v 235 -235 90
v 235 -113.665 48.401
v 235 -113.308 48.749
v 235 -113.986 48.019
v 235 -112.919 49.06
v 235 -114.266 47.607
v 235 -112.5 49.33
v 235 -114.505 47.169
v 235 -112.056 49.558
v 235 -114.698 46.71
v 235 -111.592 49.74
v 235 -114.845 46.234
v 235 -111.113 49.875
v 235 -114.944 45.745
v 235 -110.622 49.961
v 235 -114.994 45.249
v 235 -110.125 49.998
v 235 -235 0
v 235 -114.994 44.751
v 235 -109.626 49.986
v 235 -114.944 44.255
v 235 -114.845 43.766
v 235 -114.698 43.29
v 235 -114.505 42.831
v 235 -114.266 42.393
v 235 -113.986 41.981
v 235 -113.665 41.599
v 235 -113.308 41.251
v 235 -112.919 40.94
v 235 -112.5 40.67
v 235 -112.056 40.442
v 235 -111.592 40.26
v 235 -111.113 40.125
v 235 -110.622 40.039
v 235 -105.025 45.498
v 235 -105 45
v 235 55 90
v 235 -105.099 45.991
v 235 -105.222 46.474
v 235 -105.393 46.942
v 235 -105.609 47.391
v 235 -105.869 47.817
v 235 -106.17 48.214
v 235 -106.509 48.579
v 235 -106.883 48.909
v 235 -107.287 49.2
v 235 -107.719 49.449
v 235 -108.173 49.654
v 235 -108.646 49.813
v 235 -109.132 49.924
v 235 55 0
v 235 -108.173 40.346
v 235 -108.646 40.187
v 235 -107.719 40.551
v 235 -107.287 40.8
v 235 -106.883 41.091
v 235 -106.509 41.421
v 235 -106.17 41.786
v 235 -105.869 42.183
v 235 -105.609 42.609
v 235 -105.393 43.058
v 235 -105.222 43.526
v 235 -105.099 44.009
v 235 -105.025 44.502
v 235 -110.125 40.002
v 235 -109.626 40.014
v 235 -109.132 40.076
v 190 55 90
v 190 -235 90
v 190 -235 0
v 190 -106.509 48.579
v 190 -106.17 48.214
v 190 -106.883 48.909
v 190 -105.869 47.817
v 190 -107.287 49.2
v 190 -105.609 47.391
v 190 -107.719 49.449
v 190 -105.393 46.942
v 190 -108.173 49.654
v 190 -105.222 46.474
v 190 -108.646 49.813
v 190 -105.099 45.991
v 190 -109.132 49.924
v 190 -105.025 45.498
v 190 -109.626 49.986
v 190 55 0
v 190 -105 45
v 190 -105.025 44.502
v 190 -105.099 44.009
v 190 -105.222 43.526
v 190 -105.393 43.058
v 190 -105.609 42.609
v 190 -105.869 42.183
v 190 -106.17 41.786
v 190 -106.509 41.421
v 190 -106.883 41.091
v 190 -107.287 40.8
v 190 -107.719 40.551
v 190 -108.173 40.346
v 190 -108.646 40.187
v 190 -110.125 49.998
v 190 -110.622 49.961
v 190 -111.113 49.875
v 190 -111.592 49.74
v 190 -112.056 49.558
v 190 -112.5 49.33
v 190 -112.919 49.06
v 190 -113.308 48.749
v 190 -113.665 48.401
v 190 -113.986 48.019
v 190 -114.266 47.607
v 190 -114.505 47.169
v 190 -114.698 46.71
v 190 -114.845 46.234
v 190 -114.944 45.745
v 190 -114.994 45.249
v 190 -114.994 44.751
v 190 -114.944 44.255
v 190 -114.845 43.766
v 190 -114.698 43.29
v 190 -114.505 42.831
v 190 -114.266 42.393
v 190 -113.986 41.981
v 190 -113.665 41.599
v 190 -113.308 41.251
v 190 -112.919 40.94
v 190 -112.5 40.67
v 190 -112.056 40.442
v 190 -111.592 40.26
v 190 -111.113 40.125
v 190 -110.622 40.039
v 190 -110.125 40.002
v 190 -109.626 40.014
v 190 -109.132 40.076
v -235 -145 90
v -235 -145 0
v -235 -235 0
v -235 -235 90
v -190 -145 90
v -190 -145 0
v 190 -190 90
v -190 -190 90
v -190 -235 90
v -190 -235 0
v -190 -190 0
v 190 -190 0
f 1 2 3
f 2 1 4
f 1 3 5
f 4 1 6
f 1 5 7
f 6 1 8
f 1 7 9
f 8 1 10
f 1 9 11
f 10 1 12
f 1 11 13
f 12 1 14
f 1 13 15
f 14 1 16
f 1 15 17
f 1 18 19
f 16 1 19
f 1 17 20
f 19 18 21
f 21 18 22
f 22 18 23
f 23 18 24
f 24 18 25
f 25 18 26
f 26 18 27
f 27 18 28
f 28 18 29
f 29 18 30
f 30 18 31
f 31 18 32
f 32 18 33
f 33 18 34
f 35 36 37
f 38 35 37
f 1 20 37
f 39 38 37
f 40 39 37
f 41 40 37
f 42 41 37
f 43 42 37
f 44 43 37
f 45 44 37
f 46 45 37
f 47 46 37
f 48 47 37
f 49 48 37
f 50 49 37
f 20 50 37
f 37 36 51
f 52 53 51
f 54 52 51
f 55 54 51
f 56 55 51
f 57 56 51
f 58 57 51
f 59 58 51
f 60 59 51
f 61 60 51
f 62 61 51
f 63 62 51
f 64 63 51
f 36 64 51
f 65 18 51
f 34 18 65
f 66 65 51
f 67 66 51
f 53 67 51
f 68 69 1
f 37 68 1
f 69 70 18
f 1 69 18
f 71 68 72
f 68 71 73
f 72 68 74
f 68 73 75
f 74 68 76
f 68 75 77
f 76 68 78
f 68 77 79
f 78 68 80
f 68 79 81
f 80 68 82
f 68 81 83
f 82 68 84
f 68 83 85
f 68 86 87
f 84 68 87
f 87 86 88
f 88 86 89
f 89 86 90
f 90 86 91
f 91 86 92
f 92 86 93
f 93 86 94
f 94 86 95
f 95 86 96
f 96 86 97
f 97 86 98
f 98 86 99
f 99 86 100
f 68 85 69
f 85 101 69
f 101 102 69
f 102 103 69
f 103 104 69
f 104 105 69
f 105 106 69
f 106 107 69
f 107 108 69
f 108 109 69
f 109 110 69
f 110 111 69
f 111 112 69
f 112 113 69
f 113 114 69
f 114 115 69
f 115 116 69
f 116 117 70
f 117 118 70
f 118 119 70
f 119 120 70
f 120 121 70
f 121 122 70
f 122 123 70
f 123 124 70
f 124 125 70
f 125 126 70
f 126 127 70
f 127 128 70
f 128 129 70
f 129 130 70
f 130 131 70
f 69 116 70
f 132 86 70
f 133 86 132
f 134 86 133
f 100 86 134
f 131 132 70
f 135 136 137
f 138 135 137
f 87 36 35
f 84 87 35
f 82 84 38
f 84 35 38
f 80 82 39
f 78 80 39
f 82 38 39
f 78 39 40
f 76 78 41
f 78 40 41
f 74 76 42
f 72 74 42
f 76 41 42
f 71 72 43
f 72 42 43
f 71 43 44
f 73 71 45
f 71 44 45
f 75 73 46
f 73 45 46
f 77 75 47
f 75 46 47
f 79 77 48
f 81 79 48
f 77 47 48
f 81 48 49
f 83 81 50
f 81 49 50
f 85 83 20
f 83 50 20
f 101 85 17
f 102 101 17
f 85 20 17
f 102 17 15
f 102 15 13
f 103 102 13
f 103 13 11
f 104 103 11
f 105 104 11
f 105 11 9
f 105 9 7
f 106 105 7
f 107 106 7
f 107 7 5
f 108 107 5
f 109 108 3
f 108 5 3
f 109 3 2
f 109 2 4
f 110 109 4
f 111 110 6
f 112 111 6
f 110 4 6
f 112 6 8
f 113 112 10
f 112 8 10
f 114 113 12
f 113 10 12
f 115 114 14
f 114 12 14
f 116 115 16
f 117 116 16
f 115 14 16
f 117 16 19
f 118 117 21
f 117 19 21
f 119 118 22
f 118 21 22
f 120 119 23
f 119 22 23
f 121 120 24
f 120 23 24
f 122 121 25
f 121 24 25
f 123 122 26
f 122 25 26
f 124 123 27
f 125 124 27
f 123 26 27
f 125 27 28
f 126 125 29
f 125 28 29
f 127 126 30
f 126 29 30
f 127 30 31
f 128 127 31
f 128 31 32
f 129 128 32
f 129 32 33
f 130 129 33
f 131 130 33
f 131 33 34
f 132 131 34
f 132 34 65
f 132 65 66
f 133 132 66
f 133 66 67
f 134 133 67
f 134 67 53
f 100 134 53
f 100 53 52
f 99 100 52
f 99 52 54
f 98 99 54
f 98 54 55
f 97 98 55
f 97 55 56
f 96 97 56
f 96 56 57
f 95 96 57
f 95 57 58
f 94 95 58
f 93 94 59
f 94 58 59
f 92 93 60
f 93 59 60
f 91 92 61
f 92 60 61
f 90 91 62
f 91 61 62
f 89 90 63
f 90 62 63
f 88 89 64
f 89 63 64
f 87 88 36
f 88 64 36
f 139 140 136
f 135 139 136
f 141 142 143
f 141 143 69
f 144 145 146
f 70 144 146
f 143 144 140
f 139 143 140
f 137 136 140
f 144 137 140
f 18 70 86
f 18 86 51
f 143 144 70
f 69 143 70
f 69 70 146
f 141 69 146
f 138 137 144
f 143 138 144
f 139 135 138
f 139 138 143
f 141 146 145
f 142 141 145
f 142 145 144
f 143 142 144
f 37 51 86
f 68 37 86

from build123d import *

# Parameters (mm, degrees)
F1_DEPTH = 90
F2_DEPTH = 90
F3_DEPTH = 90
F4_R     = 5
F5_DEPTH = 45


with BuildPart() as f1:
    # F0 (on Top) → F1 (new body)
    with BuildSketch(Plane.XY):
        Polygon((235, -235), (235, 55), (190, 55), (190, -190), (190, -235), align=None)
    extrude(amount=F1_DEPTH)

    # F4 (on face) → F5 (cut, through all)
    with BuildSketch(Plane.YZ.offset(235)):
        with Locations((-110, 45)):
            Circle(F4_R)
    extrude(amount=-F5_DEPTH, mode=Mode.SUBTRACT)


with BuildPart() as f2:
    # F0 (on Top) → F2 (new body)
    with BuildSketch(Plane.XY):
        Polygon((190, -190), (-145, -190), (-190, -190), (-190, -235), (190, -235), align=None)
    extrude(amount=F2_DEPTH)


with BuildPart() as f3:
    # F0 (on Top) → F3 (new body)
    with BuildSketch(Plane.XY):
        Polygon((-190, -190), (-190, -145), (-235, -145), (-235, -235), (-190, -235), align=None)
    extrude(amount=F3_DEPTH)


solid = Compound([f1.part, f2.part, f3.part])
